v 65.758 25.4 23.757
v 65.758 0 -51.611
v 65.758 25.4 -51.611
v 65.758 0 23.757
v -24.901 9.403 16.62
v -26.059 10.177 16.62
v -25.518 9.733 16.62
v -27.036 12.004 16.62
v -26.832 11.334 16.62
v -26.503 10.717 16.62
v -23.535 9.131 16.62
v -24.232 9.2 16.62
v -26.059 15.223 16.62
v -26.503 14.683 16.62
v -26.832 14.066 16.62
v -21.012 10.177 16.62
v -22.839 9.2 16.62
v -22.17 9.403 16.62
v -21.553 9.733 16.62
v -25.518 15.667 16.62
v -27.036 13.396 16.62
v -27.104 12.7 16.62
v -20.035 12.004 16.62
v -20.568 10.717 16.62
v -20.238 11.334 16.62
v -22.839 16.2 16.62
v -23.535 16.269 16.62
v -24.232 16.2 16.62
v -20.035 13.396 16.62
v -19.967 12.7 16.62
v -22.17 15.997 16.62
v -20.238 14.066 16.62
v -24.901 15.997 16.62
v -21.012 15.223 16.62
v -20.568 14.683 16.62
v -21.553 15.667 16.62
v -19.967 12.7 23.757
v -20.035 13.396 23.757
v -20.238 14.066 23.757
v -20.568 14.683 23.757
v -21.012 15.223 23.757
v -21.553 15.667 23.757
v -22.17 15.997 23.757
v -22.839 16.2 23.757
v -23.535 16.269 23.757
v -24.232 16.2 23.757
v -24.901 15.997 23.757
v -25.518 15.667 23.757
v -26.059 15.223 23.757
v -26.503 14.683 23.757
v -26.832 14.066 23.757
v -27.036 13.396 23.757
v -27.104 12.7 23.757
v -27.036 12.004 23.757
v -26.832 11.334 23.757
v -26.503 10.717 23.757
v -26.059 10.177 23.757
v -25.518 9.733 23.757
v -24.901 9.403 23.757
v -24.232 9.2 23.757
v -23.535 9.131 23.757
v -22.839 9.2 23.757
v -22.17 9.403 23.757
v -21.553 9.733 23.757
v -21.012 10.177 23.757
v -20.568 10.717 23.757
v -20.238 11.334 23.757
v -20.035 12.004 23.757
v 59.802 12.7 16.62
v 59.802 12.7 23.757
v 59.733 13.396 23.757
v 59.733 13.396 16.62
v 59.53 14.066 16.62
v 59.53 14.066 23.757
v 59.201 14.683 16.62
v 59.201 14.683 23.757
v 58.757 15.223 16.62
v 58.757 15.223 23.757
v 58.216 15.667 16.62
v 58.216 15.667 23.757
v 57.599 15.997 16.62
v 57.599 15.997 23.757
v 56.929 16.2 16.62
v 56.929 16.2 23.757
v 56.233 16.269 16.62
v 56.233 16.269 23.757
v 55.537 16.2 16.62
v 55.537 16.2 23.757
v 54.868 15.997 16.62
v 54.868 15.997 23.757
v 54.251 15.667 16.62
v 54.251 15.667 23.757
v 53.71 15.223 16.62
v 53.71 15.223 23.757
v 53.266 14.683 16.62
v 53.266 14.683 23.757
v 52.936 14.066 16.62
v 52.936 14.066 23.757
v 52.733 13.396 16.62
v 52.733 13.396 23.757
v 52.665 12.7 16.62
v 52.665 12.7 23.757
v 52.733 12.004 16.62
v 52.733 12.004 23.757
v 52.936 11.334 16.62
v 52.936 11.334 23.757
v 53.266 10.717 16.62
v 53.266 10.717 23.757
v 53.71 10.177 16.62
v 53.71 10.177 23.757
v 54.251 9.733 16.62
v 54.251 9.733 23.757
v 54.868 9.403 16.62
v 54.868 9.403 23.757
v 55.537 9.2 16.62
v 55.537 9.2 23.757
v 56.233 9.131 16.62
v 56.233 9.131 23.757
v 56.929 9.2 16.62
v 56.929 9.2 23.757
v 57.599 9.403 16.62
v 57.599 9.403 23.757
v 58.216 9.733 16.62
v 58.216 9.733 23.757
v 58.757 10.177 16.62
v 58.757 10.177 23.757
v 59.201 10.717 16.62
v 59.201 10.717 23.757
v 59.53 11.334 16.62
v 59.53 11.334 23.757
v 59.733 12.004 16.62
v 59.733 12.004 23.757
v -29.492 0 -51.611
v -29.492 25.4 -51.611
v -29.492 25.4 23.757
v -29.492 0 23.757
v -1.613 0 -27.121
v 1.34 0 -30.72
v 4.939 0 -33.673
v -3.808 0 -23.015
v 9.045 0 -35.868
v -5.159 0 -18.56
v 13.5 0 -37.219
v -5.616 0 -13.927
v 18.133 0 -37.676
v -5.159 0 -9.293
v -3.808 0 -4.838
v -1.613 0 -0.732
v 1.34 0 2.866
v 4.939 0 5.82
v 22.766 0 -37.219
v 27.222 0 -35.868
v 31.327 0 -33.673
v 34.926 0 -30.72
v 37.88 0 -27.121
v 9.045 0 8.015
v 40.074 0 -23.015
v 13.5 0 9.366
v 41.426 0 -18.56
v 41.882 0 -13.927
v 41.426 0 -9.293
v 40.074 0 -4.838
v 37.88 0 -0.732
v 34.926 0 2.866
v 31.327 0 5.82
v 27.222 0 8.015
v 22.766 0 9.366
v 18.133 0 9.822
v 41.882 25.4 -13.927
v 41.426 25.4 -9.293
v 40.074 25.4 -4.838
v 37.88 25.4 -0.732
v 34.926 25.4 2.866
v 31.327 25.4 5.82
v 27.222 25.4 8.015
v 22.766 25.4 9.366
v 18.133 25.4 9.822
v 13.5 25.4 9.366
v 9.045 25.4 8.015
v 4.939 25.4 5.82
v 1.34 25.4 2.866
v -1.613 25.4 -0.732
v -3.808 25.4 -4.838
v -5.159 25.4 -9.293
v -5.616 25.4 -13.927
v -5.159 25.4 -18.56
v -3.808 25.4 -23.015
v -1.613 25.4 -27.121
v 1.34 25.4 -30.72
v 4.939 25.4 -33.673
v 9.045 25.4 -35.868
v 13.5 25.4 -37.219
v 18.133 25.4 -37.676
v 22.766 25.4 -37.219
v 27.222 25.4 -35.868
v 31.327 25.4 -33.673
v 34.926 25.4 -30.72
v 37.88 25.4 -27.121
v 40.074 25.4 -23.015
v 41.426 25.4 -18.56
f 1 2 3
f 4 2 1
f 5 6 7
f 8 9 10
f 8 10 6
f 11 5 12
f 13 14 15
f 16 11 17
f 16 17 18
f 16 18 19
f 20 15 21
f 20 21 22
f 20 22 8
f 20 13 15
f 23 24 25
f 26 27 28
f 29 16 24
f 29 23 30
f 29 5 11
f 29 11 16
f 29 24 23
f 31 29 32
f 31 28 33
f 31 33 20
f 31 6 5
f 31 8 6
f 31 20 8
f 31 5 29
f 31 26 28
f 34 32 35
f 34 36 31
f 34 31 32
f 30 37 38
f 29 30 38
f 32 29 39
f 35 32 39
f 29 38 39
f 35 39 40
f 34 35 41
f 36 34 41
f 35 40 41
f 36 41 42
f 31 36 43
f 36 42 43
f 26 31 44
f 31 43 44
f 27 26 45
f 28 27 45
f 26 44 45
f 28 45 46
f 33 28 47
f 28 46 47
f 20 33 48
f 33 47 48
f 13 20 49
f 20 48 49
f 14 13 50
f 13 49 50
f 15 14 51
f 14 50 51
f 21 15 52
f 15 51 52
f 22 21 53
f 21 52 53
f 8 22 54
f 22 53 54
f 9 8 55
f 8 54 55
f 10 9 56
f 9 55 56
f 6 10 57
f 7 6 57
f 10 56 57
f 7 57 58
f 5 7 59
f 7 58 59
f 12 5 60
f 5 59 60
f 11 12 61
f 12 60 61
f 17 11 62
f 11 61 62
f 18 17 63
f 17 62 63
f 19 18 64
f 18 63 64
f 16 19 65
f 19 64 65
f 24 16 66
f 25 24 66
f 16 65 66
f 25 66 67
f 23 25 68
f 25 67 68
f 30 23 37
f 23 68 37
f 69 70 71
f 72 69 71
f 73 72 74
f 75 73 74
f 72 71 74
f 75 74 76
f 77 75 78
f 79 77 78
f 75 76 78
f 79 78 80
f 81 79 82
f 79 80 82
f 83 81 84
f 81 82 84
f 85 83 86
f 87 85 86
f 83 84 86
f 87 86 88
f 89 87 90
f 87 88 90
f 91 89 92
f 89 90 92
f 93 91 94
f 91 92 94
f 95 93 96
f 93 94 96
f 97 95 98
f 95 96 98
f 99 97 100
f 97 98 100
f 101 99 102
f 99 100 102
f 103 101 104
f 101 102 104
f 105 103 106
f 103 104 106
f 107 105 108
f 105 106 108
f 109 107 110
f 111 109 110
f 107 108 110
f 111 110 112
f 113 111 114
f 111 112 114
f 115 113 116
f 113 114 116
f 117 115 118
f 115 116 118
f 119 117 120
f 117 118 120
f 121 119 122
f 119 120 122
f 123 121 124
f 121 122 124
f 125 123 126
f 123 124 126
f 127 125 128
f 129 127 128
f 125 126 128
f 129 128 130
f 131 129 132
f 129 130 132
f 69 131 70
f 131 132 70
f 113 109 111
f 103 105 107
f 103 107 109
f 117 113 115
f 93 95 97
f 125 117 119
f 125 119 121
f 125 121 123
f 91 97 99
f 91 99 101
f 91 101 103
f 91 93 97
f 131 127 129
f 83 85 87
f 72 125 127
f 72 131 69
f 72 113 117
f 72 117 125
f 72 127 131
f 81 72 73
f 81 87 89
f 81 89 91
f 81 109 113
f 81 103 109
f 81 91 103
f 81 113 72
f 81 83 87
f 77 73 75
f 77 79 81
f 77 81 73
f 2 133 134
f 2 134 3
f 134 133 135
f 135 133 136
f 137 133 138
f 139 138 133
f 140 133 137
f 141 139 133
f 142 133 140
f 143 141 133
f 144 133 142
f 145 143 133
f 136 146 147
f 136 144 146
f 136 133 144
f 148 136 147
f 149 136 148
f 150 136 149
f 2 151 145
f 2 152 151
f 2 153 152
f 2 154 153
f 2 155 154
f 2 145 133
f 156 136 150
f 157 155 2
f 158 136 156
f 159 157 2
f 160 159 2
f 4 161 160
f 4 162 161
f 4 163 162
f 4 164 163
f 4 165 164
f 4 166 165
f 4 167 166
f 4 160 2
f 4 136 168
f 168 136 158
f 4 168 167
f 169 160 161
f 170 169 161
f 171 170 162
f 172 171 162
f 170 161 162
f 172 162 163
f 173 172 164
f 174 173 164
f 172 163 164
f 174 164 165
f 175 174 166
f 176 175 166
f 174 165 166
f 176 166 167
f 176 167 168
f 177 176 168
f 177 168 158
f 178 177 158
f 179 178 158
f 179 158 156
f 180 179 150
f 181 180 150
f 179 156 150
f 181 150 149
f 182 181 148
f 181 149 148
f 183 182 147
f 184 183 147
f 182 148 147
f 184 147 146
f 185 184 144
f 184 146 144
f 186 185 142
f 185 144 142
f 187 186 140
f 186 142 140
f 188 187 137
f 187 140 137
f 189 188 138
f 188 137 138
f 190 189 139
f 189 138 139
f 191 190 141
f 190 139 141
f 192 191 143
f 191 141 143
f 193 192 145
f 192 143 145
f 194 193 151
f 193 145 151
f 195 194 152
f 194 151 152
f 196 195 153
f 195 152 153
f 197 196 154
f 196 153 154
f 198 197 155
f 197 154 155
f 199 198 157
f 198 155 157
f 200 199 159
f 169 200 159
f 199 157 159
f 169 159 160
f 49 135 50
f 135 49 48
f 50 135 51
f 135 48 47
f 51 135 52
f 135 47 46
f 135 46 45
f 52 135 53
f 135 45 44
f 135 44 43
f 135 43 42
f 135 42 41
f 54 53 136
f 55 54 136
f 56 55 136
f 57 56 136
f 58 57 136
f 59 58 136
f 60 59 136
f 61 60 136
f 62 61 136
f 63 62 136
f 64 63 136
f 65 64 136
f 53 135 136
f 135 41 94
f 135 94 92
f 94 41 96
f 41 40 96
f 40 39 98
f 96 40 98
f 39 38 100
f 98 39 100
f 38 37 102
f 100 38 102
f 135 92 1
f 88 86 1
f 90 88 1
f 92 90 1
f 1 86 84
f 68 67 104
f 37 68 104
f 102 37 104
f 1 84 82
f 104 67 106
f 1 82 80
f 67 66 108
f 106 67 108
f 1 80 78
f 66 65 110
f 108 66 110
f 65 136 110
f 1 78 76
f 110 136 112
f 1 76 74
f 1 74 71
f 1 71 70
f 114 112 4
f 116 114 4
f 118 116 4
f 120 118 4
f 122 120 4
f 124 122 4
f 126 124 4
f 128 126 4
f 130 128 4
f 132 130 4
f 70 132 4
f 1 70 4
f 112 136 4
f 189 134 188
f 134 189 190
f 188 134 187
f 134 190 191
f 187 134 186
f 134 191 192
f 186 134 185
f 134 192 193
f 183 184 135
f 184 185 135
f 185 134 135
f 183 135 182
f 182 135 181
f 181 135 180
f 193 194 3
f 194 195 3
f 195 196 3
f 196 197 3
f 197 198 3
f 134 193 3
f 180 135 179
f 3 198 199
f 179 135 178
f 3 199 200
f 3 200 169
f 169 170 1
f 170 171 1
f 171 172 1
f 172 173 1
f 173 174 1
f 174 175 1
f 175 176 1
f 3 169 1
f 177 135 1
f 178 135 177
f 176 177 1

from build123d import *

# Parameters (mm, degrees)
F0_W     = 95.25
F0_H     = 75.367778
F0_R     = 23.749
F1_DEPTH = 25.4
F2_R     = 3.5687
F3_DEPTH = 7.1374


with BuildPart() as f1:
    # F0 (on Front) → F1 (new body)
    with BuildSketch(Plane.XZ):
        with Locations((18.133259, -13.926655)):
            Rectangle(F0_W, F0_H)
        with Locations((18.133259, -13.926655)):
            Circle(F0_R, mode=Mode.SUBTRACT)
    extrude(amount=-F1_DEPTH)

    # F2 (on face) → F3 (cut)
    with BuildSketch(Plane.XY.offset(23.757234)):
        with Locations((-23.535441, 12.7)):
            Circle(F2_R)
        with Locations((56.233259, 12.7)):
            Circle(F2_R)
    extrude(amount=-F3_DEPTH, mode=Mode.SUBTRACT)


solid = f1.part
